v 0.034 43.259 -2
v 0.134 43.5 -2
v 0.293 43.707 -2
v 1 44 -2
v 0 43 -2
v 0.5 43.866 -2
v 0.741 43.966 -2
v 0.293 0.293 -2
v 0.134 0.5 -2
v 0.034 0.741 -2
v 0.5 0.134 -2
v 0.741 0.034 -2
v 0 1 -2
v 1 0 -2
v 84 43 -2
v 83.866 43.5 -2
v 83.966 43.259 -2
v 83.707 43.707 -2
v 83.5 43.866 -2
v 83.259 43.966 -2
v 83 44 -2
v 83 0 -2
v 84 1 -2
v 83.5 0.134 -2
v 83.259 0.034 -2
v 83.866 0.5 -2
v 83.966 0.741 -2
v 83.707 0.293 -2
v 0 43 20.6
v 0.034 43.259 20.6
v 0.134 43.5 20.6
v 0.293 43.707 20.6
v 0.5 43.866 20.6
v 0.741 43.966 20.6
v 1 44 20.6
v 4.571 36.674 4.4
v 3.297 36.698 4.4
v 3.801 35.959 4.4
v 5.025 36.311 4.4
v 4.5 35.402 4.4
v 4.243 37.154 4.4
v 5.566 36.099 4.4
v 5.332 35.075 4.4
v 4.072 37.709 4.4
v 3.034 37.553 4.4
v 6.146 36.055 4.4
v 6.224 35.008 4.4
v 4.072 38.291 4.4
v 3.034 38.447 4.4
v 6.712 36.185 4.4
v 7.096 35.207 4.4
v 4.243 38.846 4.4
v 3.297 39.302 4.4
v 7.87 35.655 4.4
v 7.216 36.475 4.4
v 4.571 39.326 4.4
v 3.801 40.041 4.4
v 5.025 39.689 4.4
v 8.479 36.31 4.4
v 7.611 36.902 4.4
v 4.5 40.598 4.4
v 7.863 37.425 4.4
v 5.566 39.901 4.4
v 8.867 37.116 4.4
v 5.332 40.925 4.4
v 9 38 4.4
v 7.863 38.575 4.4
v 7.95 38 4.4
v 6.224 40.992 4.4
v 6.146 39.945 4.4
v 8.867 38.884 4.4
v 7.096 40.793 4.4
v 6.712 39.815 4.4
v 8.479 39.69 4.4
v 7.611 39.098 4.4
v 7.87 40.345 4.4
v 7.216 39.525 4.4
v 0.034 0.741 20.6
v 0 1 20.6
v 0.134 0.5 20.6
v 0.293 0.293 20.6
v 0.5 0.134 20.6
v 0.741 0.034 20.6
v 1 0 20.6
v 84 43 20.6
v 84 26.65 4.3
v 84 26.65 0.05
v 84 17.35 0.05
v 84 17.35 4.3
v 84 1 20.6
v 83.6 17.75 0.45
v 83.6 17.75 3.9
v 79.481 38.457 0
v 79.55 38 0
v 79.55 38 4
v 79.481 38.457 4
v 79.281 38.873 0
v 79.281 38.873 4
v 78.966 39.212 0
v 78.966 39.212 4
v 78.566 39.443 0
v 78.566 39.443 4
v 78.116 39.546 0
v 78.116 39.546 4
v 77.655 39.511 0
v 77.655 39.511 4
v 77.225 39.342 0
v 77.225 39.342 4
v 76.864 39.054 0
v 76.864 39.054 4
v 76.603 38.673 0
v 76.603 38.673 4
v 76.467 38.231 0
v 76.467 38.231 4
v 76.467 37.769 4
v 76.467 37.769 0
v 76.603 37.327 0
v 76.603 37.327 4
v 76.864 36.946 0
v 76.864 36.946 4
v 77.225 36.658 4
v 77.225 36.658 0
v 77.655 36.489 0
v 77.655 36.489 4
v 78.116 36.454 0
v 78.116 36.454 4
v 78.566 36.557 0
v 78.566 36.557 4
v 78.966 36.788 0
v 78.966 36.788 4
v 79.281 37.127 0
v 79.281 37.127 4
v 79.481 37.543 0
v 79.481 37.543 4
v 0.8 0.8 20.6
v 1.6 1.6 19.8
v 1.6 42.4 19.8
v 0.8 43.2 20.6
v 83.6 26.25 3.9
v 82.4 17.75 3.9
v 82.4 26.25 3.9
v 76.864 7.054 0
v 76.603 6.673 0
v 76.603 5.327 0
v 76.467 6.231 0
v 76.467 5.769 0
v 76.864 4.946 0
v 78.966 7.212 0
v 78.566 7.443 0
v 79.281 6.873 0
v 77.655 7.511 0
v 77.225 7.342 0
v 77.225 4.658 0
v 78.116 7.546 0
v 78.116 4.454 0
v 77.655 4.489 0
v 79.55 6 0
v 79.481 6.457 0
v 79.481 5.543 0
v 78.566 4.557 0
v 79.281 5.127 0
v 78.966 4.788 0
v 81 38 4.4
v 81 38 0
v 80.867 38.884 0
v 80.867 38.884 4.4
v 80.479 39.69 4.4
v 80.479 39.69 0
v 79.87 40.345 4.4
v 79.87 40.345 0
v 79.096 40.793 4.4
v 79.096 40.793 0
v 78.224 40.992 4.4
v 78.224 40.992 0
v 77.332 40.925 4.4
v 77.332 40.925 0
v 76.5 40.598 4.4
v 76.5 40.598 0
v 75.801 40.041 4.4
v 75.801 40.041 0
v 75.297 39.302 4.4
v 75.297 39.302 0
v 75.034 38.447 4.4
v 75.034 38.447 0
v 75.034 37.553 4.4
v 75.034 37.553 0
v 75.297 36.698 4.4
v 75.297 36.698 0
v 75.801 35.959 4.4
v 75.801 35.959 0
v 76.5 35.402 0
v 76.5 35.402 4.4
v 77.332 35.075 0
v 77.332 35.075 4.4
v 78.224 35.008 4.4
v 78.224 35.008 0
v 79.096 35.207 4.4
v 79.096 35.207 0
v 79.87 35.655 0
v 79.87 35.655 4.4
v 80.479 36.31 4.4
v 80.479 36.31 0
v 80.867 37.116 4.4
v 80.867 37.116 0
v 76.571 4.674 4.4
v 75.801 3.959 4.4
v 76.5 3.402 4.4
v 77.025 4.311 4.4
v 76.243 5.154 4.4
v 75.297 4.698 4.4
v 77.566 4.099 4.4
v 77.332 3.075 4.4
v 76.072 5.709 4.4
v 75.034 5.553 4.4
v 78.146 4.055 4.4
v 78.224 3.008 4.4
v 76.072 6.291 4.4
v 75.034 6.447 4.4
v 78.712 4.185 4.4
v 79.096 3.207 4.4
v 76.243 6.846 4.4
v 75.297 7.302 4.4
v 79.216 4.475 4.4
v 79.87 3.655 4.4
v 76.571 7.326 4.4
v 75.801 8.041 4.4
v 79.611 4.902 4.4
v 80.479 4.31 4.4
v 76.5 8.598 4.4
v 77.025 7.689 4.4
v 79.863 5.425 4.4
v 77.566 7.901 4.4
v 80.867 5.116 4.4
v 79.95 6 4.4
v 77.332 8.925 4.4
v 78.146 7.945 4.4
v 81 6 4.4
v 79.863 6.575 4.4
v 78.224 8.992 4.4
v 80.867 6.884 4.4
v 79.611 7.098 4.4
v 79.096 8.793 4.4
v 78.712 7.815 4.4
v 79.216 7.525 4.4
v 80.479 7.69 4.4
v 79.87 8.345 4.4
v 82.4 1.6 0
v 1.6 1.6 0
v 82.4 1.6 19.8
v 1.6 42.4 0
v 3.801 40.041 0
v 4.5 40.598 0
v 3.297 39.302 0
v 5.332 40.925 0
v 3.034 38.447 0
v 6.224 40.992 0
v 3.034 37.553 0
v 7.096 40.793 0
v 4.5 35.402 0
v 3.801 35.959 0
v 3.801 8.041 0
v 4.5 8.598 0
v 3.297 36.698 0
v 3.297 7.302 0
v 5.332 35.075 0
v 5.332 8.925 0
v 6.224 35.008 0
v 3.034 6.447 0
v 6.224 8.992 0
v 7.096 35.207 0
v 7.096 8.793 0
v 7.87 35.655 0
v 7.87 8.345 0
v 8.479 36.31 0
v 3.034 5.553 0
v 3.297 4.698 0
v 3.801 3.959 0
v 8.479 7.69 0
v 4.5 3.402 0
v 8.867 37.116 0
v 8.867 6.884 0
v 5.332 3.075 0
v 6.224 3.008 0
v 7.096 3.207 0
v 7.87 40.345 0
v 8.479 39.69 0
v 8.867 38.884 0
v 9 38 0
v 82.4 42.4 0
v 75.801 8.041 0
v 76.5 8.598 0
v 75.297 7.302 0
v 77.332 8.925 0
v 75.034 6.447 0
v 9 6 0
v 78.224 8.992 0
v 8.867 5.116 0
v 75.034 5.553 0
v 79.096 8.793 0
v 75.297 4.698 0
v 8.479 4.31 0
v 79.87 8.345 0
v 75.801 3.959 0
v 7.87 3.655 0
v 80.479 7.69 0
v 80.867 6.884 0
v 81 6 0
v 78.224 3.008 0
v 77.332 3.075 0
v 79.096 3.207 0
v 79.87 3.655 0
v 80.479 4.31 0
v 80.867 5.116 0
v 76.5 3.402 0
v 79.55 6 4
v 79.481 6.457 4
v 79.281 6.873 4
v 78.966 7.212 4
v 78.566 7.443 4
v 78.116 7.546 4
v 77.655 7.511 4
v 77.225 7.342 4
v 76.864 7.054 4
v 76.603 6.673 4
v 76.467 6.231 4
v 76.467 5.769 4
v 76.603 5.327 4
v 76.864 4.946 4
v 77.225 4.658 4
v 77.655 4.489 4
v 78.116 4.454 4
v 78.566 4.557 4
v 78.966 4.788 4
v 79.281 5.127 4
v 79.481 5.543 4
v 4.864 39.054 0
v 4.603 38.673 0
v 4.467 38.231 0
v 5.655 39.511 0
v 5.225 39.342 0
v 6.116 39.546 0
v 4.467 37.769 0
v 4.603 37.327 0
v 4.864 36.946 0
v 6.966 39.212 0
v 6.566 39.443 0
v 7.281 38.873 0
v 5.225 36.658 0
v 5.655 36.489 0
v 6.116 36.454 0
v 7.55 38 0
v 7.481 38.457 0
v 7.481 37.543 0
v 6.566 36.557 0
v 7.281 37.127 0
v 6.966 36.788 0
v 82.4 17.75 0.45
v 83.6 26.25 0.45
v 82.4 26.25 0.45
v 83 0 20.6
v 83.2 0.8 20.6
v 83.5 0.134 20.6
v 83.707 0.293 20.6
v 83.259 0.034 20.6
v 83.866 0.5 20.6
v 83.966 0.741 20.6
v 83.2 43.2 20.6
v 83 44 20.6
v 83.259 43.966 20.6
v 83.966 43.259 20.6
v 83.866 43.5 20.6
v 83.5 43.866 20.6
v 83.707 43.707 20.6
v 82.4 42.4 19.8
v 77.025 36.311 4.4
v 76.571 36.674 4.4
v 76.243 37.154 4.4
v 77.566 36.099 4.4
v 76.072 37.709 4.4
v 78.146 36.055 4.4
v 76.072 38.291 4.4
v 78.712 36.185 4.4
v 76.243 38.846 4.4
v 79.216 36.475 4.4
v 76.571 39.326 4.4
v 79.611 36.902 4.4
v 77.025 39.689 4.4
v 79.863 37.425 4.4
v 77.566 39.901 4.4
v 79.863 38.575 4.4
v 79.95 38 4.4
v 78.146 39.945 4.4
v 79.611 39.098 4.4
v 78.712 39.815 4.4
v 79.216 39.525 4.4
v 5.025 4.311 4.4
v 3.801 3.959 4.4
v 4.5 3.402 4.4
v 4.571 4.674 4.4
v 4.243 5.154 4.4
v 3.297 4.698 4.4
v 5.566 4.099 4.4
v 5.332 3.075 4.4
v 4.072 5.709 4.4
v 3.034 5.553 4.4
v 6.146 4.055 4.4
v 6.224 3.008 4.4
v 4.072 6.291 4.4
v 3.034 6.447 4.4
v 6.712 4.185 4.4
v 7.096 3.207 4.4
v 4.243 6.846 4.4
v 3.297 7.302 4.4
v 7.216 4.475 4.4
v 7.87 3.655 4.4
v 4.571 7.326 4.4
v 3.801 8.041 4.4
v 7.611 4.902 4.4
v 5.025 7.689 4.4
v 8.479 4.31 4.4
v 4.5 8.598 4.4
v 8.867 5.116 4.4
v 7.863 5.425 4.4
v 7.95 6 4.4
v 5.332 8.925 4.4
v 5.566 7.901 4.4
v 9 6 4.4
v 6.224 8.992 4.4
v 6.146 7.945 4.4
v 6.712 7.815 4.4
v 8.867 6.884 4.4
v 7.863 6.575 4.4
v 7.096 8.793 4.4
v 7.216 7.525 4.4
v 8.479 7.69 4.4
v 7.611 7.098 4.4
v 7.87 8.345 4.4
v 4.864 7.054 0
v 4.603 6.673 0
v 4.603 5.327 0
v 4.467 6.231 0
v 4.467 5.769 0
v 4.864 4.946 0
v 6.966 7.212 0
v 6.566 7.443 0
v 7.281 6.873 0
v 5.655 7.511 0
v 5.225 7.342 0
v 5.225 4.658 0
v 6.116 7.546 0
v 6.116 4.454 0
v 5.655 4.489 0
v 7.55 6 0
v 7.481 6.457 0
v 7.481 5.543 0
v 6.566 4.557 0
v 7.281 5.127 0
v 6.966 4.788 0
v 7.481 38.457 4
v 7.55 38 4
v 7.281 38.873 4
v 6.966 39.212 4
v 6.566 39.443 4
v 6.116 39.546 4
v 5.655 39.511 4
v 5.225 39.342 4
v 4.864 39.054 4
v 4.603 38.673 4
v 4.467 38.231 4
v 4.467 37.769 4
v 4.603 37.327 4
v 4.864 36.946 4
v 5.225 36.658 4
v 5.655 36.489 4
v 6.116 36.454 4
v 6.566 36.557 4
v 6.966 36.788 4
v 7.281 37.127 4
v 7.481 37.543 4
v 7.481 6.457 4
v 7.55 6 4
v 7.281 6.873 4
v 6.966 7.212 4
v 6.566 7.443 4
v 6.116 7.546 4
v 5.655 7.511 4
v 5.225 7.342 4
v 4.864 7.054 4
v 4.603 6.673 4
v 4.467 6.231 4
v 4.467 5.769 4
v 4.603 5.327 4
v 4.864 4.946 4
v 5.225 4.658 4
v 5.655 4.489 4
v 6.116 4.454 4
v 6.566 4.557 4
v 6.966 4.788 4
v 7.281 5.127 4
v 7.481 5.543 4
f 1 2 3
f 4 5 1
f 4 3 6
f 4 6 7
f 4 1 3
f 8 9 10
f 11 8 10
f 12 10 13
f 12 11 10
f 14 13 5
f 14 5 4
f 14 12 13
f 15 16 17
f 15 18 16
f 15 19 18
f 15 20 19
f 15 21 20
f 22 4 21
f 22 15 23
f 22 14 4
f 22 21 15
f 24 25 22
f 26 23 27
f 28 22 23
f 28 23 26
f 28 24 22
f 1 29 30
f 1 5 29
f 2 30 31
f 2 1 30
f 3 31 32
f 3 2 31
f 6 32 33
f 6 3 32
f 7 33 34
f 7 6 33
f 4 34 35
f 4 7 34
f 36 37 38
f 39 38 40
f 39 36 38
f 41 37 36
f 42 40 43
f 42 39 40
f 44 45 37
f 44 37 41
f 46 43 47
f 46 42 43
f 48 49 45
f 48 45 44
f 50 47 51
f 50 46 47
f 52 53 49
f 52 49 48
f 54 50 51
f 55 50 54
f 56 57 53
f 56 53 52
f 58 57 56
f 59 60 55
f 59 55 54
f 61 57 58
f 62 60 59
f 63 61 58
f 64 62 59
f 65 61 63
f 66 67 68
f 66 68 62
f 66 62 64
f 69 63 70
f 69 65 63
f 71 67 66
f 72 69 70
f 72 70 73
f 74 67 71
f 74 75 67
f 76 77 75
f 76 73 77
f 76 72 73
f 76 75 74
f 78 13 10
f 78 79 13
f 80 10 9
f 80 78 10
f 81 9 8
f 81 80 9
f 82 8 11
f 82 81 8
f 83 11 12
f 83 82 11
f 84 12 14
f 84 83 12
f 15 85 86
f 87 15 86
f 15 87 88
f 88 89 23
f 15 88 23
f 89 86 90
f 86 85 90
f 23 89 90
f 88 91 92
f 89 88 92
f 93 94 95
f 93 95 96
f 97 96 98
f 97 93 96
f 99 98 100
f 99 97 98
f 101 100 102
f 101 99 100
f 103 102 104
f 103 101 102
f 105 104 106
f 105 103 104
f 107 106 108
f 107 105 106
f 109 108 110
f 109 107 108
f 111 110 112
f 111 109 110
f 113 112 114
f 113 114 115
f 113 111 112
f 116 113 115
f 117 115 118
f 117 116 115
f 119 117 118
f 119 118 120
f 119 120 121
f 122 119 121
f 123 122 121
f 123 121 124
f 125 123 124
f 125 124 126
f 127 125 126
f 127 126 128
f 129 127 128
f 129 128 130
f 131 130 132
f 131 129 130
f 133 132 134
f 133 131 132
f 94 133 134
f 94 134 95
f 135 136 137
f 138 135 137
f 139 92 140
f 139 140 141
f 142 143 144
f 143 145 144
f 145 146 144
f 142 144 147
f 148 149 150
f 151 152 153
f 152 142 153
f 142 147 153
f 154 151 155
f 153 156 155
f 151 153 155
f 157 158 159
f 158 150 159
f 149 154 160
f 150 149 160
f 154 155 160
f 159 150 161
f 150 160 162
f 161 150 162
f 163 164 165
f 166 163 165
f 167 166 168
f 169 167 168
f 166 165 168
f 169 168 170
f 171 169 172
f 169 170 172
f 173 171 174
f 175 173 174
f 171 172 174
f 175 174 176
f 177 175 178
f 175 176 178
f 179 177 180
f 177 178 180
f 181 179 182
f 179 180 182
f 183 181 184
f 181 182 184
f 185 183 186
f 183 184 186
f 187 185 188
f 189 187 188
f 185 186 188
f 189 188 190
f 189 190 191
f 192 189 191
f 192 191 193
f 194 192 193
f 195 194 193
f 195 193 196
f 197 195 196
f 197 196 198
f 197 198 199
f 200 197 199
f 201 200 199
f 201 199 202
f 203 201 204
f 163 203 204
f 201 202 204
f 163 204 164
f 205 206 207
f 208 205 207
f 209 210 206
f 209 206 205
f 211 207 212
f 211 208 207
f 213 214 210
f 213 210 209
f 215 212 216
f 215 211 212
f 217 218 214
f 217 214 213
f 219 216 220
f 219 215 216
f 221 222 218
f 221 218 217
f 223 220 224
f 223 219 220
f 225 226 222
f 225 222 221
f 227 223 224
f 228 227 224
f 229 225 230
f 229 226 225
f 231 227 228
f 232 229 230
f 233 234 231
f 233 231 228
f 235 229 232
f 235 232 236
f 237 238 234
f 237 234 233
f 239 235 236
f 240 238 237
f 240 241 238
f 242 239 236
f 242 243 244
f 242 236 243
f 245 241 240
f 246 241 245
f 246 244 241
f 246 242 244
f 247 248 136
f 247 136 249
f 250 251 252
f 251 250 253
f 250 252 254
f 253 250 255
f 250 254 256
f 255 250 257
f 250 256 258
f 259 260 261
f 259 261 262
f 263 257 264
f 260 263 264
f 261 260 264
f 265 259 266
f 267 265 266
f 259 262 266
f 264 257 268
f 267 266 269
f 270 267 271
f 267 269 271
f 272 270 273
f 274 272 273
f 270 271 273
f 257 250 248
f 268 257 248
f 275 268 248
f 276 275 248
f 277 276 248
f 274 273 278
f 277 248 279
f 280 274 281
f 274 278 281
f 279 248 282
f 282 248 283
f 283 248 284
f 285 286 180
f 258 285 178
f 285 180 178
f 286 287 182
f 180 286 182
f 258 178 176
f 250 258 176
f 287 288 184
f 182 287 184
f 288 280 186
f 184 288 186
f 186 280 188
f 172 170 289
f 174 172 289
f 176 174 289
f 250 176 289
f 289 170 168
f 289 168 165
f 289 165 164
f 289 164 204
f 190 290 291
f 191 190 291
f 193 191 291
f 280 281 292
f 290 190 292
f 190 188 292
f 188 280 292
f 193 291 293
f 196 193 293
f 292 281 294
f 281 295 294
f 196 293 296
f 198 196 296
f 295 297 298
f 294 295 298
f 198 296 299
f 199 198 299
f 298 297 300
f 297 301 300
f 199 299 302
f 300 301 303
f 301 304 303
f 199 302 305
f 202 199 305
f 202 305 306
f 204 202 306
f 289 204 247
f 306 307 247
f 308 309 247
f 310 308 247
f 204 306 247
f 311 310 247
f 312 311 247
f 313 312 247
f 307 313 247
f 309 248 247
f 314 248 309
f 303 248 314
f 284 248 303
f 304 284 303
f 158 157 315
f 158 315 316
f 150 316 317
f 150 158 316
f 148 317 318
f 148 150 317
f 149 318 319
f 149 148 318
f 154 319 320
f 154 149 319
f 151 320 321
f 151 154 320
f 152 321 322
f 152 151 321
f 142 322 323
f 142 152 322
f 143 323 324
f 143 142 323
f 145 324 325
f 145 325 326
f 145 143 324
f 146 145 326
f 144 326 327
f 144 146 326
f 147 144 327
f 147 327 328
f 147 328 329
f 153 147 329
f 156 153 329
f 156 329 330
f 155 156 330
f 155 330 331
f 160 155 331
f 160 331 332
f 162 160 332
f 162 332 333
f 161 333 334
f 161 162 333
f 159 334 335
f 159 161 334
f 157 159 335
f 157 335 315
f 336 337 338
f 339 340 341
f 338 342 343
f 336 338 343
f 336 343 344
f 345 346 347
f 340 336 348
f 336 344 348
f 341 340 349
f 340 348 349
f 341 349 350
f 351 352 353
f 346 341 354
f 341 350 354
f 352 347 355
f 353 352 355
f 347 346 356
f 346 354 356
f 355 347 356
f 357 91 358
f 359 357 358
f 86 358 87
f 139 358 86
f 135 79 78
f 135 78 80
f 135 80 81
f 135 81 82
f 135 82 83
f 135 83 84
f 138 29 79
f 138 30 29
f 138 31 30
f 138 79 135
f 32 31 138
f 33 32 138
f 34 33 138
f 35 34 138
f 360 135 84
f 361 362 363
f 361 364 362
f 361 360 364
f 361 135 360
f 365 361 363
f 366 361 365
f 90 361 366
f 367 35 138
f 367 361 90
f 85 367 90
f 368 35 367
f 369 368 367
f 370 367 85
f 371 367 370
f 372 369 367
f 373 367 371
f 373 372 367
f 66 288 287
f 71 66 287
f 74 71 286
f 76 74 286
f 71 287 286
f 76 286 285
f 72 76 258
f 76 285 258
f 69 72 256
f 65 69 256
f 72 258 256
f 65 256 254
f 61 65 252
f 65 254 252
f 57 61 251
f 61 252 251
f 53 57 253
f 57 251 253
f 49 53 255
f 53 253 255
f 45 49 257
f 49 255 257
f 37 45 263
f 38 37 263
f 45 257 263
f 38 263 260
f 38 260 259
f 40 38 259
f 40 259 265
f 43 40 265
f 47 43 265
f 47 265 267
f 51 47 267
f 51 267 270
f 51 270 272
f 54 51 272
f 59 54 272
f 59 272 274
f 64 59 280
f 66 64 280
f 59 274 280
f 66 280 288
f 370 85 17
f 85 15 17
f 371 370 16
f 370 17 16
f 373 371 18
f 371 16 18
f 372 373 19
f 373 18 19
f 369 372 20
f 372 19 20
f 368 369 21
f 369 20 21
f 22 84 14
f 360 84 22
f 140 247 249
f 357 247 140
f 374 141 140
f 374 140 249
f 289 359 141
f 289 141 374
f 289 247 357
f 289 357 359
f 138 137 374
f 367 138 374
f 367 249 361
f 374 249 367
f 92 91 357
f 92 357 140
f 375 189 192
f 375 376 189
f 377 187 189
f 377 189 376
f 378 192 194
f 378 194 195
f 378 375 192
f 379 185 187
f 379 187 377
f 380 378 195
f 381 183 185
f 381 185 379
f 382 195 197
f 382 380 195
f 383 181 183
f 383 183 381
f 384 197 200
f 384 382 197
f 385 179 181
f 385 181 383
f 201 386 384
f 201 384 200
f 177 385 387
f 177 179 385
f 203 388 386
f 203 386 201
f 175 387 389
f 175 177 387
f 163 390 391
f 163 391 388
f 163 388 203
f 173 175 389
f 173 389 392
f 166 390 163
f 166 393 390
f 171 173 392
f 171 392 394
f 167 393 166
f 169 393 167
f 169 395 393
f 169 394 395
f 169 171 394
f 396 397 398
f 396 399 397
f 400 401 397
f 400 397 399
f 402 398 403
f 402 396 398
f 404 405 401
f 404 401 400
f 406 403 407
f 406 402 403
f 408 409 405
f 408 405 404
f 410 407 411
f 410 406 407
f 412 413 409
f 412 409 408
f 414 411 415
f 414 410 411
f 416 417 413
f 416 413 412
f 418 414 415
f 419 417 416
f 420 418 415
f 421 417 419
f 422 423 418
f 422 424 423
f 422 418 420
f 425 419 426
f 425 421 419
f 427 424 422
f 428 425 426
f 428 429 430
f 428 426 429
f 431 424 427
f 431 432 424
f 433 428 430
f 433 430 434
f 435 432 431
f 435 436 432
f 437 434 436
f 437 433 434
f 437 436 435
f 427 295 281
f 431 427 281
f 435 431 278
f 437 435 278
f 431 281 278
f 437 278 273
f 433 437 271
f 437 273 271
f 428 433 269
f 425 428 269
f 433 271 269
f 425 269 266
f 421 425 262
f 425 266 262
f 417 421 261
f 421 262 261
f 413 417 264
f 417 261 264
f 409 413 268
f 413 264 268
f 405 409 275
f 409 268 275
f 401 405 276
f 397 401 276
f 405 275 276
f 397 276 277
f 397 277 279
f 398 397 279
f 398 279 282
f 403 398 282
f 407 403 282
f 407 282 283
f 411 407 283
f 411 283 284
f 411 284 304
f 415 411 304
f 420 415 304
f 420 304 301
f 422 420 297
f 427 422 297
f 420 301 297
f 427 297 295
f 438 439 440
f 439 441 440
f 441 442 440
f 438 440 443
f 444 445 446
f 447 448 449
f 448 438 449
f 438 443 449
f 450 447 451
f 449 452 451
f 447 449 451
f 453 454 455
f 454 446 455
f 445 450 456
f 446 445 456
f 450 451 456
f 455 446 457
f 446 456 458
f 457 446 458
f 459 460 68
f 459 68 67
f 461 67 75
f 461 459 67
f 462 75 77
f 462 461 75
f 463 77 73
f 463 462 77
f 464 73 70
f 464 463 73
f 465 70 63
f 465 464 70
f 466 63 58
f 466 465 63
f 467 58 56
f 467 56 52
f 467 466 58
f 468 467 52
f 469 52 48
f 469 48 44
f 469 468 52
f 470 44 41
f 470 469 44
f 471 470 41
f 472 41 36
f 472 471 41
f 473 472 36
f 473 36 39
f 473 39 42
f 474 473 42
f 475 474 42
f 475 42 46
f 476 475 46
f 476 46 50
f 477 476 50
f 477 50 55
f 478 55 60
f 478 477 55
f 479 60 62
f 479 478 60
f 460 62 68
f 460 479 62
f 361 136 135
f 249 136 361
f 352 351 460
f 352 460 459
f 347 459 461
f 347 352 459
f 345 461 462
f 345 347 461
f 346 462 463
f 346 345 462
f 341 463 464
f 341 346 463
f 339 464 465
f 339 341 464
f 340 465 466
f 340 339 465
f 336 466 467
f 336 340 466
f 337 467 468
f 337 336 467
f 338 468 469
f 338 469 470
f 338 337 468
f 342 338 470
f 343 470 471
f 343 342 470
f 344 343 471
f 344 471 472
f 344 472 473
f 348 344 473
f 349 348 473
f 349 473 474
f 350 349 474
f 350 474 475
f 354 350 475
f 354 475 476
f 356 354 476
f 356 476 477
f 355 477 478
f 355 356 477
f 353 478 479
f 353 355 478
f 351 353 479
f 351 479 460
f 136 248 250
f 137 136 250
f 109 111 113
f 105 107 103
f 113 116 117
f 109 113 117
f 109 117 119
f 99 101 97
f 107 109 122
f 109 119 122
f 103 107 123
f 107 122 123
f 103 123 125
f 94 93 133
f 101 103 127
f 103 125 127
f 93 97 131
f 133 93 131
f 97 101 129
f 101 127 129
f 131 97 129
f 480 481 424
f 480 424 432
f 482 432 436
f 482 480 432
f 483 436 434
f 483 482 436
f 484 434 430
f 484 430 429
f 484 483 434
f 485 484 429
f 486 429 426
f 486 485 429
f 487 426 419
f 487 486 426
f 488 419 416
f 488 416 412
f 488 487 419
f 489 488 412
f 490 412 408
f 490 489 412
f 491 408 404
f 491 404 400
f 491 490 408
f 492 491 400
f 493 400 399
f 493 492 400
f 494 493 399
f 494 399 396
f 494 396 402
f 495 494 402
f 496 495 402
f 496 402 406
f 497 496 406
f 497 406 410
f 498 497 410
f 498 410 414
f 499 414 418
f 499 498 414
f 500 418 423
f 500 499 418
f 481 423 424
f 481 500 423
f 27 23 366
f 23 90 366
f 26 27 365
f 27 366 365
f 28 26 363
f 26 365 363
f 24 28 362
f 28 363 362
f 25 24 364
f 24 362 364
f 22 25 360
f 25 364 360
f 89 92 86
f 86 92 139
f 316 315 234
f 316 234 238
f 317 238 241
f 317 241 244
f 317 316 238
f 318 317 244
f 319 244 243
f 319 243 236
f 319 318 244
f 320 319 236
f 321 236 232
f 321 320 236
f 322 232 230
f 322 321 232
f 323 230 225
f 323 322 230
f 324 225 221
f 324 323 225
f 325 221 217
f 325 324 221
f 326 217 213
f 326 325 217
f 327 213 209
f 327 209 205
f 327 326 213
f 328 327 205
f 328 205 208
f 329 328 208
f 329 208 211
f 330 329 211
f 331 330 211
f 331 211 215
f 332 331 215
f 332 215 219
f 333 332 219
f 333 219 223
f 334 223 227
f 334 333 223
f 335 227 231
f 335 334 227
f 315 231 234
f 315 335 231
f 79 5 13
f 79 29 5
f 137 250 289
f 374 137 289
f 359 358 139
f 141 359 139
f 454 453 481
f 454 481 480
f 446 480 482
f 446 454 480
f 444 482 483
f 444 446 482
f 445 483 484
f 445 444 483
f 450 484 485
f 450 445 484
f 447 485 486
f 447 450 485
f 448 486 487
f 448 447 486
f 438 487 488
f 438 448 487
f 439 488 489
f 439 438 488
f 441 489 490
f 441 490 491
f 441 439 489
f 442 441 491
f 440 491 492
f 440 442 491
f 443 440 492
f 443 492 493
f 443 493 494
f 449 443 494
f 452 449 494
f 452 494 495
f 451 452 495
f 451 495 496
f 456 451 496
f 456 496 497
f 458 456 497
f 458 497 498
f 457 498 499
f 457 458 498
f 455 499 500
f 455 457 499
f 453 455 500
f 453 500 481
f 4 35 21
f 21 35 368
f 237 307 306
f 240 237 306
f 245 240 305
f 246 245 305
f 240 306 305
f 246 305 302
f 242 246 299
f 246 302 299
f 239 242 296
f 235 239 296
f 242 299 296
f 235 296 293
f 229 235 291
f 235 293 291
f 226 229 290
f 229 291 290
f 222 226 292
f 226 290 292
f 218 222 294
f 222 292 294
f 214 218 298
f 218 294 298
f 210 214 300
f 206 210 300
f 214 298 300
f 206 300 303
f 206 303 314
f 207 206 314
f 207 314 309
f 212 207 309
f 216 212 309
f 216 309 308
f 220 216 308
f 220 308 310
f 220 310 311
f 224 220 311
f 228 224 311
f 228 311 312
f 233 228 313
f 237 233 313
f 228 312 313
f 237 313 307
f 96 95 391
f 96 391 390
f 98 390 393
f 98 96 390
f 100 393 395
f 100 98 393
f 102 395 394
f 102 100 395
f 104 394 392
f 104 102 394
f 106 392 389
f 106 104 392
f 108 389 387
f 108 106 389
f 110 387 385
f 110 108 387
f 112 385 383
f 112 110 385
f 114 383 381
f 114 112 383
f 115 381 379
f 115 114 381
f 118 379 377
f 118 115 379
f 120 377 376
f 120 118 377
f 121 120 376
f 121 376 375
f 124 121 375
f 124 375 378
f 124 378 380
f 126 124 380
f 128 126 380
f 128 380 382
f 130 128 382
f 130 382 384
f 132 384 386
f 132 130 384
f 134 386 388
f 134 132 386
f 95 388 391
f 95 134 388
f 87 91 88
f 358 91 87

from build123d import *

# Parameters (mm, degrees)
SKETCH001_W     = 84
SKETCH001_H     = 44
SKETCH001_W_2   = 80.8
SKETCH001_H_2   = 40.8
PAD_DEPTH       = 20.6
SKETCH002_W     = 84
SKETCH002_H     = 44
PAD001_DEPTH    = 2
SKETCH003_R     = 3
SKETCH003_R_2   = 1.55
PAD002_DEPTH    = 4.4
SKETCH004_W     = 8.5
SKETCH004_H     = 3.45
POCKET_DEPTH    = 1.6
CHAMFER_SIZE    = 0.8
CHAMFER001_SIZE = 0.4
FILLET_R        = 1
CHAMFER002_SIZE = 0.4


with BuildPart() as part:
    # Sketch001 → Pad (new body)
    with BuildSketch(Plane.XY):
        with Locations((42, 22)):
            Rectangle(SKETCH001_W, SKETCH001_H)
        with Locations((42, 22)):
            Rectangle(SKETCH001_W_2, SKETCH001_H_2, mode=Mode.SUBTRACT)
    extrude(amount=PAD_DEPTH)

    # Sketch002 (on Face9 of Pad) → Pad001 (join)
    with BuildSketch(Plane(origin=(0, 0, 0), x_dir=(1, 0, 0), z_dir=(0, 0, -1))):
        with Locations((42, -22)):
            Rectangle(SKETCH002_W, SKETCH002_H)
    extrude(amount=PAD001_DEPTH)

    # Sketch003 (on Face8 of Pad001) → Pad002 (join)
    with BuildSketch(Plane.XY):
        with Locations((6, 38)):
            Circle(SKETCH003_R)
        with Locations((6, 38)):
            Circle(SKETCH003_R_2, mode=Mode.SUBTRACT)
        with Locations((78, 38)):
            Circle(SKETCH003_R)
        with Locations((78, 38)):
            Circle(SKETCH003_R_2, mode=Mode.SUBTRACT)
        with Locations((78, 6)):
            Circle(SKETCH003_R)
        with Locations((78, 6)):
            Circle(SKETCH003_R_2, mode=Mode.SUBTRACT)
        with Locations((6, 6)):
            Circle(SKETCH003_R)
        with Locations((6, 6)):
            Circle(SKETCH003_R_2, mode=Mode.SUBTRACT)
    extrude(amount=PAD002_DEPTH)

    # Sketch004 (on Face4 of Pad002) → Pocket (cut)
    with BuildSketch(Plane.YZ.offset(84)):
        with Locations((22, 2.175)):
            Rectangle(SKETCH004_W, SKETCH004_H)
    extrude(amount=-POCKET_DEPTH, mode=Mode.SUBTRACT)

    # Chamfer
    chamfer_edges = [part.edges().sort_by_distance(p)[0] for p in [
        (1.6, 22, 20.6),
        (42, 42.4, 20.6),
        (82.4, 22, 20.6),
        (42, 1.6, 20.6),
    ]]
    chamfer(chamfer_edges, length=CHAMFER_SIZE)

    # Chamfer001
    chamfer001_edges = [part.edges().sort_by_distance(p)[0] for p in [
        (4.45, 38, 4.4),
        (76.45, 38, 4.4),
        (76.45, 6, 4.4),
        (4.45, 6, 4.4),
    ]]
    chamfer(chamfer001_edges, length=CHAMFER001_SIZE)

    # Fillet
    fillet_edges = [part.edges().sort_by_distance(p)[0] for p in [
        (0, 0, 9.3),
        (84, 0, 9.3),
        (84, 44, 9.3),
        (0, 44, 9.3),
    ]]
    fillet(fillet_edges, radius=FILLET_R)

    # Chamfer002
    chamfer002_edges = [part.edges().sort_by_distance(p)[0] for p in [
        (84, 22, 3.9),
        (84, 26.25, 2.175),
        (84, 22, 0.45),
        (84, 17.75, 2.175),
    ]]
    chamfer(chamfer002_edges, length=CHAMFER002_SIZE)


solid = part.part
